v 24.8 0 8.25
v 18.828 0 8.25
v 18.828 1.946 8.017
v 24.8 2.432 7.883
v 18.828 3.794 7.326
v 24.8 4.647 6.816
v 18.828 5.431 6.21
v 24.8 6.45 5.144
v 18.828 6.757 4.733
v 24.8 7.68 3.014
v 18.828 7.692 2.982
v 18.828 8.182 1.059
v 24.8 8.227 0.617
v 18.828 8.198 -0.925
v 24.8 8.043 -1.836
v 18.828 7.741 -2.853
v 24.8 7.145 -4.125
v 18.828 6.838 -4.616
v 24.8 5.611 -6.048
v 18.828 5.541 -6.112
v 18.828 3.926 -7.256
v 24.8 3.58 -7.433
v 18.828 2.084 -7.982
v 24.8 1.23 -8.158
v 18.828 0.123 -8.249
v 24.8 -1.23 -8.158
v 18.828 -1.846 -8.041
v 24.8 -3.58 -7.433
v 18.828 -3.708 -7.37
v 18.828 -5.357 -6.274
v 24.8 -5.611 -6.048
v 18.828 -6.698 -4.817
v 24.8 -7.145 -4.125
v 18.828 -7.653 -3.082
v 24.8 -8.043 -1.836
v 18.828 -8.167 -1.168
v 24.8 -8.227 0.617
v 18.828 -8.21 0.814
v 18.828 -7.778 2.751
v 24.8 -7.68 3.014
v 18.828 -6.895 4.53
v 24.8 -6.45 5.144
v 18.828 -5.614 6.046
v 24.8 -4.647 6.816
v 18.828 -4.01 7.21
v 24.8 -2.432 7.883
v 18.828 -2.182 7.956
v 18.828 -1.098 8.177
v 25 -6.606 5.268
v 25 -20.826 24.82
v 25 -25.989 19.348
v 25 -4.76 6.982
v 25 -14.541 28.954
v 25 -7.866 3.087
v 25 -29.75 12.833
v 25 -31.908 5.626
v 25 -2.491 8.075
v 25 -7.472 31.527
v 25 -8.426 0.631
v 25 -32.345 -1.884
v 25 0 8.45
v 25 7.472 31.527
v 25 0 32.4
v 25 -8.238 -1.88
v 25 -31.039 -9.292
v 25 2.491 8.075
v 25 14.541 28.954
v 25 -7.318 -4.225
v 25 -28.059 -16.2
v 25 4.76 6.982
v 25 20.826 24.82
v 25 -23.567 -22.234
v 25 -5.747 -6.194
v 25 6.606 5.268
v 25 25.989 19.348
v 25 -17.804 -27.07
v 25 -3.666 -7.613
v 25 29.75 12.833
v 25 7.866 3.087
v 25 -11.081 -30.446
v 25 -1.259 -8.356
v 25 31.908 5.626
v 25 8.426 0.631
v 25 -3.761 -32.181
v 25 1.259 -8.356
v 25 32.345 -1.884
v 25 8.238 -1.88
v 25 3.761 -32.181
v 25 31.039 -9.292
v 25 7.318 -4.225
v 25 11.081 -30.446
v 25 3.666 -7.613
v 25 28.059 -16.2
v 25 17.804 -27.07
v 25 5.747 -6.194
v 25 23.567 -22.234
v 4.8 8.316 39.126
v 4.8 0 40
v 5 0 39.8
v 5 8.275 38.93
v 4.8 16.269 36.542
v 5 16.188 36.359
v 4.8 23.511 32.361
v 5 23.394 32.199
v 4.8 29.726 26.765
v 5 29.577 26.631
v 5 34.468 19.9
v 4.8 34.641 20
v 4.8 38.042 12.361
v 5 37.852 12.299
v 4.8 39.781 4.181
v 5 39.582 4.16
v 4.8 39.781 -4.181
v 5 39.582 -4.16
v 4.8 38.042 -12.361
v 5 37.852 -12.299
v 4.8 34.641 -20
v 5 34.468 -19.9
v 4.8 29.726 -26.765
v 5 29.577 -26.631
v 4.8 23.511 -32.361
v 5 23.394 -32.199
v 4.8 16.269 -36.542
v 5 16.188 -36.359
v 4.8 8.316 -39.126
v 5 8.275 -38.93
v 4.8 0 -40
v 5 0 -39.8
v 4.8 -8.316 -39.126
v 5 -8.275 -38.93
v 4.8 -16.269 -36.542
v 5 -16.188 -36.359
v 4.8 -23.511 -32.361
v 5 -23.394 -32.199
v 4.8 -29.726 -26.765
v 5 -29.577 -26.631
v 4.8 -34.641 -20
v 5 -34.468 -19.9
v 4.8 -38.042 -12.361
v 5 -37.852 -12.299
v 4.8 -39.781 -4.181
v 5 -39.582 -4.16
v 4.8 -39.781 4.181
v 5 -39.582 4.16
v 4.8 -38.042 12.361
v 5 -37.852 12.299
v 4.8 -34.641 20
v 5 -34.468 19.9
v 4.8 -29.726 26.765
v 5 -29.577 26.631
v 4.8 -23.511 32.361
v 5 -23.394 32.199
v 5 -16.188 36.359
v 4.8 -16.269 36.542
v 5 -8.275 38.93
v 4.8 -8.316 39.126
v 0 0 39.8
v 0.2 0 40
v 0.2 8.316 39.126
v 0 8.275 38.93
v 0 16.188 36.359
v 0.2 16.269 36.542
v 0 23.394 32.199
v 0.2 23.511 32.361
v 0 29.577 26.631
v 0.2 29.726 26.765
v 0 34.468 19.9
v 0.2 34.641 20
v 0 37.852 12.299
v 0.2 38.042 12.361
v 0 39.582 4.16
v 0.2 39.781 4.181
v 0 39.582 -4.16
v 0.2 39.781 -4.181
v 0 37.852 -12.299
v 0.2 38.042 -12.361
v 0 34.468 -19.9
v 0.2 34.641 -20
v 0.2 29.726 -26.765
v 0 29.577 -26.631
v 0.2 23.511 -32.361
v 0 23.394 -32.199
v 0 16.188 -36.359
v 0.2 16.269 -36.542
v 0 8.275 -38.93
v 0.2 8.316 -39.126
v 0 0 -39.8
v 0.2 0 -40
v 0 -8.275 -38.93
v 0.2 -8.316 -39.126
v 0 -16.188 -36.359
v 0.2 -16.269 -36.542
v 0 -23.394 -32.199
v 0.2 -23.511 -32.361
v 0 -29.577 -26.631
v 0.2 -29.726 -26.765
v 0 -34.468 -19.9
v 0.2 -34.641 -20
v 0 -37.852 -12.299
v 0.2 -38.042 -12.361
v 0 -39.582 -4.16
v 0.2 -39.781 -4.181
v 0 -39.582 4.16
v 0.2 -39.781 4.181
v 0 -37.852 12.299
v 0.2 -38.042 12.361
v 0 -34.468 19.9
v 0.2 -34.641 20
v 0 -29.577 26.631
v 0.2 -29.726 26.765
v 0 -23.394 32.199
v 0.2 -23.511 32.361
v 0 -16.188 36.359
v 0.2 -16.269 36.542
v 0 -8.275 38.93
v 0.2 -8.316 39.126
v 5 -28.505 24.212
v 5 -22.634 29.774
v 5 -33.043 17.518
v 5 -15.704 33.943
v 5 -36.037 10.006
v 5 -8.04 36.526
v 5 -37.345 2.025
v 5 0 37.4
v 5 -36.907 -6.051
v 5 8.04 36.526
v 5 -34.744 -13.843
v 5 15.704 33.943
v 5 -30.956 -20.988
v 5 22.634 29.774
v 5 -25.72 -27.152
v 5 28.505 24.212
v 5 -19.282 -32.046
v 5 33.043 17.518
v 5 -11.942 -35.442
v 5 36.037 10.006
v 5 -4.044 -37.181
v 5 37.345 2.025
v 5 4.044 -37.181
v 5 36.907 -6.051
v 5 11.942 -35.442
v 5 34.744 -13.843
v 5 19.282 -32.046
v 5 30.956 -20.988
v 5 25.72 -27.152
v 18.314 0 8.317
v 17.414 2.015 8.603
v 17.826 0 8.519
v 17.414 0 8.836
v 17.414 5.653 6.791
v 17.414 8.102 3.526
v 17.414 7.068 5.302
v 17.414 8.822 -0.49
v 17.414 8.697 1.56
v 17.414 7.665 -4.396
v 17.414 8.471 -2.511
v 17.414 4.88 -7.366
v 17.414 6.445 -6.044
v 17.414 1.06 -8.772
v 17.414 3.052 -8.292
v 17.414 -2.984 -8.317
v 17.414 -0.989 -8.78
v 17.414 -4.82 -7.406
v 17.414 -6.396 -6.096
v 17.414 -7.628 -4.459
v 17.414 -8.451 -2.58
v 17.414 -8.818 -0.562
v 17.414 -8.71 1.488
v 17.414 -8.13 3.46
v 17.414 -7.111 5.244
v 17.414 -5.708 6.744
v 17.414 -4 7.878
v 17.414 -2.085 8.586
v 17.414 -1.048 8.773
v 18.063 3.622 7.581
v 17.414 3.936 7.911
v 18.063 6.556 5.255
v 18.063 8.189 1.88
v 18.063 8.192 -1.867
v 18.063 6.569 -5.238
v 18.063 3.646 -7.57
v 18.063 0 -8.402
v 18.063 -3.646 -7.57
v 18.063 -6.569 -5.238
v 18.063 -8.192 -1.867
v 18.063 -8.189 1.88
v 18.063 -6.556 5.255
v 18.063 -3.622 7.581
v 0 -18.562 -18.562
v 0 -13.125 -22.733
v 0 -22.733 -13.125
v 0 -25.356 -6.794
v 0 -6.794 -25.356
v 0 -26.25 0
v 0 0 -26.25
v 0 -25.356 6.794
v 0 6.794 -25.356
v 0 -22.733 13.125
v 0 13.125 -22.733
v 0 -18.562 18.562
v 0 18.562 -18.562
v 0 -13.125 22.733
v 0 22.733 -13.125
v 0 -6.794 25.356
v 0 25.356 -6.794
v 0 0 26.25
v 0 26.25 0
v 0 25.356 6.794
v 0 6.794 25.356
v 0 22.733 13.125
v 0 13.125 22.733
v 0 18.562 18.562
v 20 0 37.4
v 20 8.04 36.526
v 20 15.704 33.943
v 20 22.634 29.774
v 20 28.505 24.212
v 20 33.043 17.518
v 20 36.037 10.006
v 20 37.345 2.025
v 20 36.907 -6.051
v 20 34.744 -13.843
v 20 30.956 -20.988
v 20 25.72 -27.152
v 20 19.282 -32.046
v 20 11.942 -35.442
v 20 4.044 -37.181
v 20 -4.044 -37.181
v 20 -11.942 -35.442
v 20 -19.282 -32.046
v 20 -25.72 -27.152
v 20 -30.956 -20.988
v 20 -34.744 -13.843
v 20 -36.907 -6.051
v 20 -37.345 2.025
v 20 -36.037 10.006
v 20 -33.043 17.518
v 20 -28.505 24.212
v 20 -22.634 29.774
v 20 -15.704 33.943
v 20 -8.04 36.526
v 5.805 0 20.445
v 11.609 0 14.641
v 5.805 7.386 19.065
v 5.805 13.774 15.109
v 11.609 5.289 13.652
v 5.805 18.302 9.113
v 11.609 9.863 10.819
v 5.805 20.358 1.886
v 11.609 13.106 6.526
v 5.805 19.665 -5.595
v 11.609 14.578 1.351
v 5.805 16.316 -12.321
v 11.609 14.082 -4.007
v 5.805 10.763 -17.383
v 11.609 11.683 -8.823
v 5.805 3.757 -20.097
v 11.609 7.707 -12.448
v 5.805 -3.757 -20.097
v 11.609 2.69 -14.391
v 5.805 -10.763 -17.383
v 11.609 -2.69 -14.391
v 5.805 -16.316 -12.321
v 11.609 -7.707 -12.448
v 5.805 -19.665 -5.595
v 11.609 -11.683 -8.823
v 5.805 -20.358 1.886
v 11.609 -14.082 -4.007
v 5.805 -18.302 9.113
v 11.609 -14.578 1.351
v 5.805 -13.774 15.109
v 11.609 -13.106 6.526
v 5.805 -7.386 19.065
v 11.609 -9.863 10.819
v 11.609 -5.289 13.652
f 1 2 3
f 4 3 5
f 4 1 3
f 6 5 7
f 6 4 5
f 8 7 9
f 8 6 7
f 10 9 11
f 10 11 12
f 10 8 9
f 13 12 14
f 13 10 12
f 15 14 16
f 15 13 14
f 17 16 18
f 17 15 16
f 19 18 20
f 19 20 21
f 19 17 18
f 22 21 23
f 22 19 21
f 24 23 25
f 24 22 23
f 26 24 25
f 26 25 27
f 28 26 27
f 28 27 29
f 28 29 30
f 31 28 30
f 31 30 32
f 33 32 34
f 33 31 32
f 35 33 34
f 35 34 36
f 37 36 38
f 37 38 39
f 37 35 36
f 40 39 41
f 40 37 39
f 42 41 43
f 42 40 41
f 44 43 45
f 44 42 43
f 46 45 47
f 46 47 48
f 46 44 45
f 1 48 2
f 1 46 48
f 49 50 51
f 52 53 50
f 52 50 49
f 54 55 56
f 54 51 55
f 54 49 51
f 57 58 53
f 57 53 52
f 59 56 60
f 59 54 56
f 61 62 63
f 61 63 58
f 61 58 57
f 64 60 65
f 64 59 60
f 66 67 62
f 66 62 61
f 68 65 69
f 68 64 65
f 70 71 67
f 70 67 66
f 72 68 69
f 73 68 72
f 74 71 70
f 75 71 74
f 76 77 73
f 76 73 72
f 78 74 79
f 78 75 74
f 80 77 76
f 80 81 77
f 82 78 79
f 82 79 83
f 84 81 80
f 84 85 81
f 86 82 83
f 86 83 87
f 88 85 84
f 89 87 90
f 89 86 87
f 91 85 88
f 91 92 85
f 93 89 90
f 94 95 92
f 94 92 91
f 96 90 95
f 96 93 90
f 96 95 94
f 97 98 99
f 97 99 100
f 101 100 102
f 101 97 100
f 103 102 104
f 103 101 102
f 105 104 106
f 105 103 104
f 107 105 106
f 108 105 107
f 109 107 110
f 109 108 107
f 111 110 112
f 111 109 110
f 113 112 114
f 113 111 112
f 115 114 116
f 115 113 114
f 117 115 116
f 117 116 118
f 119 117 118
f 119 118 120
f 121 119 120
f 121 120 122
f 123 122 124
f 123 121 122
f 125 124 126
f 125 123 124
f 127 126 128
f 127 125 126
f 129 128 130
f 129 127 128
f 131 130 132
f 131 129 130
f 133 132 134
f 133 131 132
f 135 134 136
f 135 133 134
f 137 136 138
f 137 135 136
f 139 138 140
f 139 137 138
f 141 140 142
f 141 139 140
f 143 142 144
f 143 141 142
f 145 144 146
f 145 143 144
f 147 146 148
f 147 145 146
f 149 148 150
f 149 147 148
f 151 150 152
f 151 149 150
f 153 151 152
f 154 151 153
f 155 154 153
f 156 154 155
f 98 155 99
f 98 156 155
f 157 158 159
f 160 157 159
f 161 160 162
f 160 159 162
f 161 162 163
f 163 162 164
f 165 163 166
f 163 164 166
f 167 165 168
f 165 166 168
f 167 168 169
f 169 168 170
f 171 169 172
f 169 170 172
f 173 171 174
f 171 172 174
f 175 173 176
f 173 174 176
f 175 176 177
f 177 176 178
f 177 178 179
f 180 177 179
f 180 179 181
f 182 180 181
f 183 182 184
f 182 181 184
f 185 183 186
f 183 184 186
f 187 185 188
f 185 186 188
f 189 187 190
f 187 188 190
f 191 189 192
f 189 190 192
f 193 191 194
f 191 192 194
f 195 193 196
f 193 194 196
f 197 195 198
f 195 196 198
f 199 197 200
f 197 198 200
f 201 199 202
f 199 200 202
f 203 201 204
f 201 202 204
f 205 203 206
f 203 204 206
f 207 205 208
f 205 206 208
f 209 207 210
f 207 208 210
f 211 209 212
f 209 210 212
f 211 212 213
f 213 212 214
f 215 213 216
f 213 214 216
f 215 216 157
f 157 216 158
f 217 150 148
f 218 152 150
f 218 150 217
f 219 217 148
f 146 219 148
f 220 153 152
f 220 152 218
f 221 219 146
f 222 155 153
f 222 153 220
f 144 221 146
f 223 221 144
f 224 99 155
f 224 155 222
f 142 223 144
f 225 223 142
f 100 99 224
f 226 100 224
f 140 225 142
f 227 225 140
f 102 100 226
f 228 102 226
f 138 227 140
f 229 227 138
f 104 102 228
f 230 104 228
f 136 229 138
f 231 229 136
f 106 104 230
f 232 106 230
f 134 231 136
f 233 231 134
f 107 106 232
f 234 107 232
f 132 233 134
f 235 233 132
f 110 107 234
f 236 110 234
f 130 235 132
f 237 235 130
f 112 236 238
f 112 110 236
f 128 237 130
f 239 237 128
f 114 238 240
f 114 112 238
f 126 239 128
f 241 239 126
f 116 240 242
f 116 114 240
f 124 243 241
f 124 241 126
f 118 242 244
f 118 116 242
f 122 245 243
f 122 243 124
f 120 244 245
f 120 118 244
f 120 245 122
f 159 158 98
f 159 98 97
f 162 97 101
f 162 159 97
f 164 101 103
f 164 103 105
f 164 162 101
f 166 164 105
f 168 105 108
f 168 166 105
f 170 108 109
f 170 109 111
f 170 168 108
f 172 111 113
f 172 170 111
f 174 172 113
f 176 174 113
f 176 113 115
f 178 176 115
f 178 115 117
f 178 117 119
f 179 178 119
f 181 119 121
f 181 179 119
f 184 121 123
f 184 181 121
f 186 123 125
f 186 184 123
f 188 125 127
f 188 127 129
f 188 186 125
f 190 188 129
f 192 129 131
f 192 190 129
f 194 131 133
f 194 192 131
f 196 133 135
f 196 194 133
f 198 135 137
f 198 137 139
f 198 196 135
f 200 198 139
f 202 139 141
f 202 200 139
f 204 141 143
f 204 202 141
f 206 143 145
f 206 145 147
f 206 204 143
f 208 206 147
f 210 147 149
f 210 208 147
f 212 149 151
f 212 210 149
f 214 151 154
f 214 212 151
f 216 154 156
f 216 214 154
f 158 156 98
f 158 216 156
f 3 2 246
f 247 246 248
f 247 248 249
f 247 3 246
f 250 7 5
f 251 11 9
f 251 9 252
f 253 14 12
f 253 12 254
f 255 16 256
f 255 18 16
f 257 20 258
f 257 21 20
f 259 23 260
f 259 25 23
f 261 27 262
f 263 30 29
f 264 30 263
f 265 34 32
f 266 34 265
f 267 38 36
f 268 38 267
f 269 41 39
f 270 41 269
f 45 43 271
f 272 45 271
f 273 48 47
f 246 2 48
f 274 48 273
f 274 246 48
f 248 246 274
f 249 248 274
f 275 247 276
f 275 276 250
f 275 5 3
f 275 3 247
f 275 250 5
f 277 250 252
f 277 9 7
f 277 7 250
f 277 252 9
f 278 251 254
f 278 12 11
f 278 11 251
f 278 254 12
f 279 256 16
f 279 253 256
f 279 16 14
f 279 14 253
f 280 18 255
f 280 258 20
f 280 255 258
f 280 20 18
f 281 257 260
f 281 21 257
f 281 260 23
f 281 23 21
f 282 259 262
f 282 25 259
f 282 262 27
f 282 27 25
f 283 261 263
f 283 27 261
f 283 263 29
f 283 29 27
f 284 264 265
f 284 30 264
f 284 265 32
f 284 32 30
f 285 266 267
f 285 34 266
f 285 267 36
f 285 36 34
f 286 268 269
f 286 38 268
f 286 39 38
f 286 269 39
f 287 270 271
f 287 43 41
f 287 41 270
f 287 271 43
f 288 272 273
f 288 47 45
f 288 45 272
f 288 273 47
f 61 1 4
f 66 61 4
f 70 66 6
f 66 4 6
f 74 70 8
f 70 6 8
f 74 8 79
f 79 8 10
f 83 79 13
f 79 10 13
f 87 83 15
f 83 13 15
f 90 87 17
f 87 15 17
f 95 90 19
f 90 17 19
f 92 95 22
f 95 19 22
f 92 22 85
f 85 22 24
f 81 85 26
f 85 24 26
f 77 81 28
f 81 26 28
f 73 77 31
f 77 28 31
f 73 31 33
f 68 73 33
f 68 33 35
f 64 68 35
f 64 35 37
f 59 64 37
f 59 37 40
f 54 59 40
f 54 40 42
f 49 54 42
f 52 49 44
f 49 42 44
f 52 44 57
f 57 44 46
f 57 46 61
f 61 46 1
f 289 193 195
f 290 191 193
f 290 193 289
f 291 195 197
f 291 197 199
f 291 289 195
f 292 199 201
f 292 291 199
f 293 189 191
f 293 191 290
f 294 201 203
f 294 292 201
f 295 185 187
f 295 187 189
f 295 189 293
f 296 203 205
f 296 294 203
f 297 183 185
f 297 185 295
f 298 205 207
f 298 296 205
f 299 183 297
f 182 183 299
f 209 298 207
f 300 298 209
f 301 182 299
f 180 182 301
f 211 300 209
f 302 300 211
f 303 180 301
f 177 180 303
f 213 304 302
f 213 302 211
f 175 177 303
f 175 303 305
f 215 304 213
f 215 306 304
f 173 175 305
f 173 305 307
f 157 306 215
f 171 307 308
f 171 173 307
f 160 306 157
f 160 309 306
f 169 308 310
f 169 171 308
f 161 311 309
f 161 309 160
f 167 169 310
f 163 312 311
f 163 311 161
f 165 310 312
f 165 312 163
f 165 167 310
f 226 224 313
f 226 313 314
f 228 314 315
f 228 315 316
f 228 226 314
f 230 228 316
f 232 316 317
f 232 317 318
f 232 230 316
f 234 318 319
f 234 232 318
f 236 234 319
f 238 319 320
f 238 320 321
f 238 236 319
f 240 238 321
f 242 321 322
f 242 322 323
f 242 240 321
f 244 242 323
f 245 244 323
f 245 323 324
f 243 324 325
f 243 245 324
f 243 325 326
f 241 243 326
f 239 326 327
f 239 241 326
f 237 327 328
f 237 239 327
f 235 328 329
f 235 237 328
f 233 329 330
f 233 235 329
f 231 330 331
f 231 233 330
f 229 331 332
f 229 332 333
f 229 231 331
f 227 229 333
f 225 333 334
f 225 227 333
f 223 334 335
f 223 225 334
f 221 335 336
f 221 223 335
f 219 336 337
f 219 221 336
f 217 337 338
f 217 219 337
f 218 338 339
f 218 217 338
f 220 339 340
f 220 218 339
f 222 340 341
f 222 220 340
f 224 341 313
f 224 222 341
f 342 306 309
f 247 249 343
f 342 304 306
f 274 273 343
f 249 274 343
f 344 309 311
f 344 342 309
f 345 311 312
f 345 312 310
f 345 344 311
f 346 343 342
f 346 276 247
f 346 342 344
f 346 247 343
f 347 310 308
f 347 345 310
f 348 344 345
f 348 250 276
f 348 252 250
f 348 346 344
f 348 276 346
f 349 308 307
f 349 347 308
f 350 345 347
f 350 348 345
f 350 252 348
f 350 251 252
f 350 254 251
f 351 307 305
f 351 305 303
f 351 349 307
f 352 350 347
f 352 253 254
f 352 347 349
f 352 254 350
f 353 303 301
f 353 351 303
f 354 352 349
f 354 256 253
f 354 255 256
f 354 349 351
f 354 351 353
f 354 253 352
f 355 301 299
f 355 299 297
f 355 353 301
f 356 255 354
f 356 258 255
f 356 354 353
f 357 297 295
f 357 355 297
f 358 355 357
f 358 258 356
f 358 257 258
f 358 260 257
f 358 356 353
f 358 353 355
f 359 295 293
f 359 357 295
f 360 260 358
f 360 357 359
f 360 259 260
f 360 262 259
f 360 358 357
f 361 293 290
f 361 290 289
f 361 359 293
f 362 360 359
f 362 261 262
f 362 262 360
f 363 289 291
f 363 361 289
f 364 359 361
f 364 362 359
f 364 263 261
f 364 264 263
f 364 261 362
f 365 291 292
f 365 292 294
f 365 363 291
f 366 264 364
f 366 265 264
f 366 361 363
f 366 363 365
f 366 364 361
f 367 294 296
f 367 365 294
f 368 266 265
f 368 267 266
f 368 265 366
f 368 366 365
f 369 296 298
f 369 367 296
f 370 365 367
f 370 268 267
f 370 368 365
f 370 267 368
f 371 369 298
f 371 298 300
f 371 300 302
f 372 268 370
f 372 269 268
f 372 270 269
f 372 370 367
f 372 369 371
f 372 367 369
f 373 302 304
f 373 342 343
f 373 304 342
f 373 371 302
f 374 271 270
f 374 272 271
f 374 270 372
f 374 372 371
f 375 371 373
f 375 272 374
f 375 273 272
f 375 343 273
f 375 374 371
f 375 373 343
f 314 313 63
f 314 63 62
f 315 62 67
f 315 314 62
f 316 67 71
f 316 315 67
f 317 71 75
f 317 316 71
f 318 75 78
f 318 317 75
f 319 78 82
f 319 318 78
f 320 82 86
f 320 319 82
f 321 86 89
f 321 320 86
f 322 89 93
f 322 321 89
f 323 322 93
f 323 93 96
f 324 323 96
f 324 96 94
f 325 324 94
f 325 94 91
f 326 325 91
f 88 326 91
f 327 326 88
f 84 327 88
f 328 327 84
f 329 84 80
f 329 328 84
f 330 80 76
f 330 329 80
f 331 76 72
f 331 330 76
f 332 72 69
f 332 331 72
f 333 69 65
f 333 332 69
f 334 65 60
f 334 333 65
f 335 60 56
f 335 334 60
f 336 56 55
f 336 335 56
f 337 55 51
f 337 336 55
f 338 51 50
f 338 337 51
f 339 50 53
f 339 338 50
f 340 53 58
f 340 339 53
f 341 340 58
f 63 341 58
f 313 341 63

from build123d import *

# Parameters (mm, degrees)
F2_SIZE = 5
F3_SIZE = 0.2
F4_R    = 2


with BuildPart() as f1:
    # F0 (on Front) → F1 (revolve)
    with BuildSketch(Plane.XZ):
        Polygon((0, 40), (0, 26.25), (18, 8.25), (25, 8.25), (25, 37.4), (5, 37.4), (5, 40), align=None)
    revolve(axis=Axis((12.5, 0, 0), (-1, 0, 0)))

    # F2
    f2_edges = [f1.edges().sort_by_distance(p)[0] for p in [
        (25, 0, -37.4),
    ]]
    chamfer(f2_edges, length=F2_SIZE)

    # F3
    f3_edges = [f1.edges().sort_by_distance(p)[0] for p in [
        (25, 0, -8.25),
        (5, 0, -40),
        (0, 0, -40),
    ]]
    chamfer(f3_edges, length=F3_SIZE)

    # F4
    f4_edges = [f1.edges().sort_by_distance(p)[0] for p in [
        (18, 0, -8.25),
    ]]
    fillet(f4_edges, radius=F4_R)


solid = f1.part
